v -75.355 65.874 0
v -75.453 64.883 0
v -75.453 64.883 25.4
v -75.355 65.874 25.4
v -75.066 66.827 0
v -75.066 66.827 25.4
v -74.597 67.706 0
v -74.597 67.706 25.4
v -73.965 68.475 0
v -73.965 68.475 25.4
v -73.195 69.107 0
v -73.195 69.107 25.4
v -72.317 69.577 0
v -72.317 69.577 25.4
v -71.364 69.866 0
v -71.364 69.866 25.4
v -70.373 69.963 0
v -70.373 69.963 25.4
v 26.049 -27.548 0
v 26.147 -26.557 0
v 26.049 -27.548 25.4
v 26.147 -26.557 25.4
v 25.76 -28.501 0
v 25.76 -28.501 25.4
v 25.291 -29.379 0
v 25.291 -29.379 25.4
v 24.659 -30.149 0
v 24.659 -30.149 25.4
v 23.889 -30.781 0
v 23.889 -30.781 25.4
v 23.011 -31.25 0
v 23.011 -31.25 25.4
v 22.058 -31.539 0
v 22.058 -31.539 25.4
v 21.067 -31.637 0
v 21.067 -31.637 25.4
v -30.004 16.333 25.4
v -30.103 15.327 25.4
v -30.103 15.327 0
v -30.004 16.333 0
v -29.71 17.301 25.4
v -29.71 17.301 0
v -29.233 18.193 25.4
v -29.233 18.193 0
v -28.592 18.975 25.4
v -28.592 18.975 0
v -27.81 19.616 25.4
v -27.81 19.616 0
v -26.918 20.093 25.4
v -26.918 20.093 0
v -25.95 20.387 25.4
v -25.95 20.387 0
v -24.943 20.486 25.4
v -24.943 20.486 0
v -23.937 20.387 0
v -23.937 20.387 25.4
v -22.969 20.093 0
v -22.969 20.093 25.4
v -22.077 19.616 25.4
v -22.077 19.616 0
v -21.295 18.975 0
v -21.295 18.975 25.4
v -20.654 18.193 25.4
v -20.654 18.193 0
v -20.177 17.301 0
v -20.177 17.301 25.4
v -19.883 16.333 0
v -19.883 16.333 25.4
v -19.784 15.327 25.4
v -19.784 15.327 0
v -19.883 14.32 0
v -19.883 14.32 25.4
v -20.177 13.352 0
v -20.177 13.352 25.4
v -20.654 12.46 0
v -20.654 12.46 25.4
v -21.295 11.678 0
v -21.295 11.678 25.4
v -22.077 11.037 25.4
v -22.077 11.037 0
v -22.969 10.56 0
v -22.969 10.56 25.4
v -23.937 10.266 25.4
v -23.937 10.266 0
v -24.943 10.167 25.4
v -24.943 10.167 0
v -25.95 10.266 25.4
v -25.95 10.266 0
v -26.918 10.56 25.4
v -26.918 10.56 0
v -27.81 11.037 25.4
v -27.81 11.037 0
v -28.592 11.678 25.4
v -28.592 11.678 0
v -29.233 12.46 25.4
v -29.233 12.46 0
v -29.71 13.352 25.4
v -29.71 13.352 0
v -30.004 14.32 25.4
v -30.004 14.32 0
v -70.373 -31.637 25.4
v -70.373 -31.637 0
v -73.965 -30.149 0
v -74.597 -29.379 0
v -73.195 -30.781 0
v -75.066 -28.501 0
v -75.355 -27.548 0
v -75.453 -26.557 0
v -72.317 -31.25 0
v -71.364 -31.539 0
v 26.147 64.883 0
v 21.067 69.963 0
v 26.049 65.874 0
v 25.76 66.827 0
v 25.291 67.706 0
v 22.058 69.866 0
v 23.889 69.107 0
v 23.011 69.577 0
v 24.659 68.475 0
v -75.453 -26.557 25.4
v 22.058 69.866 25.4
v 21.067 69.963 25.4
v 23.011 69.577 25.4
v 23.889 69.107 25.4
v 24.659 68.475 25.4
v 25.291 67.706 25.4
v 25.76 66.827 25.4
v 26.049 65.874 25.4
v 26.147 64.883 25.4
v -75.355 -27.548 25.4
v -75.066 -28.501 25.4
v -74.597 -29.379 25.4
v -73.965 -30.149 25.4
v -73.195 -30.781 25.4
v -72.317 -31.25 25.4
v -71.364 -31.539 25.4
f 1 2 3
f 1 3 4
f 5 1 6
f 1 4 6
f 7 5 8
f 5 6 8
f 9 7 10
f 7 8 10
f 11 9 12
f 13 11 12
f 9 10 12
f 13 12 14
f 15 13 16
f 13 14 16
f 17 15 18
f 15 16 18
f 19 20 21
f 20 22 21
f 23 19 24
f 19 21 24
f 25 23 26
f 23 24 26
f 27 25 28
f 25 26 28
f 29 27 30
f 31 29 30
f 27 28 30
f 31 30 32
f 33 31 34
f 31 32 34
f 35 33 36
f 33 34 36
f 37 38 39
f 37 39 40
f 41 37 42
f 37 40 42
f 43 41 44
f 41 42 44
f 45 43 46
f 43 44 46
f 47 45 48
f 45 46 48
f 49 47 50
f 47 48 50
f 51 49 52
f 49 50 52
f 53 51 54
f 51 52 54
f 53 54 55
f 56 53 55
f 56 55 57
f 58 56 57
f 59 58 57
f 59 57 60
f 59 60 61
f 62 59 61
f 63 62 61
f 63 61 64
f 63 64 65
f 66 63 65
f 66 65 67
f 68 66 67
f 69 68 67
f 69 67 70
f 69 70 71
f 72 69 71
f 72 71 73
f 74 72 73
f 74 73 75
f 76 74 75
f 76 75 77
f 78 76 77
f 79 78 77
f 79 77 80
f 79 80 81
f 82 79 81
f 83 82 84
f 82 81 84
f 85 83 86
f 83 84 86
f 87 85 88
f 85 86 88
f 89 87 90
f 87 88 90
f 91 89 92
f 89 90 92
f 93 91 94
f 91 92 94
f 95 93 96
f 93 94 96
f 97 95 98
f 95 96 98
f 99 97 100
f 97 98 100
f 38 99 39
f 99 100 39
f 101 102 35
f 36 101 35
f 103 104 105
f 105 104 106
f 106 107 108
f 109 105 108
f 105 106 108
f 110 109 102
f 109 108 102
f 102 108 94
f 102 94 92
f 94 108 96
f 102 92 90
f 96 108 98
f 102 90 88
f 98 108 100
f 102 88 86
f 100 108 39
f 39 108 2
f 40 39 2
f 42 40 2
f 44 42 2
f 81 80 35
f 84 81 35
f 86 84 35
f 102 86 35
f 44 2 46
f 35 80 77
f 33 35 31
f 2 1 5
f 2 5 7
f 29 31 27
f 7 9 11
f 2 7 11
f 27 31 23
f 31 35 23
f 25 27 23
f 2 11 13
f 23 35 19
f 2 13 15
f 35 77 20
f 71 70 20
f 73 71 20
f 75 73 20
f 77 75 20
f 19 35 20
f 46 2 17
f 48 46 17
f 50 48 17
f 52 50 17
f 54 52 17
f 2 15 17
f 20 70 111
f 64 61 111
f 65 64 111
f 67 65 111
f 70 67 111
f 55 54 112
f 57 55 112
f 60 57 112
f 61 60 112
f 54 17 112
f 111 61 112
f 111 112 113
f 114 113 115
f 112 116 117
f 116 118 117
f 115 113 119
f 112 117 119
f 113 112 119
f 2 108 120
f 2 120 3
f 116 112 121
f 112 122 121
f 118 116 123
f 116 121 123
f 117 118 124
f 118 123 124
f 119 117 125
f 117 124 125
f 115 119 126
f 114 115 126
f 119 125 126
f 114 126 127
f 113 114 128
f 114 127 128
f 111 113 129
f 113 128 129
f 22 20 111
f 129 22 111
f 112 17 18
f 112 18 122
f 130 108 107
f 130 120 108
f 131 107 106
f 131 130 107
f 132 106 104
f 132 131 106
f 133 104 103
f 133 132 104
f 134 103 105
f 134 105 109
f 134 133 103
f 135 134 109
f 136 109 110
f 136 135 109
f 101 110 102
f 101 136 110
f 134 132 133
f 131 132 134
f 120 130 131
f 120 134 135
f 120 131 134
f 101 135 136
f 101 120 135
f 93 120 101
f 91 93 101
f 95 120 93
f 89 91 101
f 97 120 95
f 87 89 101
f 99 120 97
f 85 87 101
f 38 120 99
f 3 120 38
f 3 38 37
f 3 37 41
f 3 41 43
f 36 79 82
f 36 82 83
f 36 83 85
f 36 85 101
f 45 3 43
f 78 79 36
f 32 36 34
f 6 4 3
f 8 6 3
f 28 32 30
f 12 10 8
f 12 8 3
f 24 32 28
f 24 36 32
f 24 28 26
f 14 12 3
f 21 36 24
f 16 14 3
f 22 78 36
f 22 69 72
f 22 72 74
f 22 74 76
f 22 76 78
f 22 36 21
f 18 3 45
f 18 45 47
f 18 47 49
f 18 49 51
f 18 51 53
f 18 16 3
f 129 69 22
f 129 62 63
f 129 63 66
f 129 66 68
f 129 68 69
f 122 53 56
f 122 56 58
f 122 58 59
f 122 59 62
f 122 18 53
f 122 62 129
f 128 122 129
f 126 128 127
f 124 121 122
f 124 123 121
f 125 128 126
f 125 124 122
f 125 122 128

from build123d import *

# Parameters (mm, degrees)
F0_W     = 101.6
F0_H     = 101.6
F1_DEPTH = 25.4
F2_R     = 5.08
F3_R     = 5.08
F4_R     = 5.08
F5_R     = 5.08
F7_D     = 10.31875


# Not quite as in the source:
# - a length typed as a fraction of an inch, garbled in the dataset ("3 / 203.2 mm" for 3/8 in), is restored


with BuildPart() as f1:
    # F0 (on Top) → F1 (new body)
    with BuildSketch(Plane.XY):
        with Locations((-24.6530866301, 19.163233228)):
            Rectangle(F0_W, F0_H)
    extrude(amount=F1_DEPTH)

    # F2
    f2_edges = [f1.edges().sort_by_distance(p)[0] for p in [
        (-75.453087, 69.963233, 12.7),
    ]]
    fillet(f2_edges, radius=F2_R)

    # F3
    f3_edges = [f1.edges().sort_by_distance(p)[0] for p in [
        (-75.453087, -31.636767, 12.7),
    ]]
    fillet(f3_edges, radius=F3_R)

    # F4
    f4_edges = [f1.edges().sort_by_distance(p)[0] for p in [
        (26.146913, 69.963233, 12.7),
    ]]
    fillet(f4_edges, radius=F4_R)

    # F5
    f5_edges = [f1.edges().sort_by_distance(p)[0] for p in [
        (26.146913, -31.636767, 12.7),
    ]]
    fillet(f5_edges, radius=F5_R)

    # F7 (through all)
    with Locations(Plane.XY.offset(25.4)):
        with Locations((-24.9434951693, 15.3265725821)):
            Hole(F7_D / 2)


solid = f1.part
